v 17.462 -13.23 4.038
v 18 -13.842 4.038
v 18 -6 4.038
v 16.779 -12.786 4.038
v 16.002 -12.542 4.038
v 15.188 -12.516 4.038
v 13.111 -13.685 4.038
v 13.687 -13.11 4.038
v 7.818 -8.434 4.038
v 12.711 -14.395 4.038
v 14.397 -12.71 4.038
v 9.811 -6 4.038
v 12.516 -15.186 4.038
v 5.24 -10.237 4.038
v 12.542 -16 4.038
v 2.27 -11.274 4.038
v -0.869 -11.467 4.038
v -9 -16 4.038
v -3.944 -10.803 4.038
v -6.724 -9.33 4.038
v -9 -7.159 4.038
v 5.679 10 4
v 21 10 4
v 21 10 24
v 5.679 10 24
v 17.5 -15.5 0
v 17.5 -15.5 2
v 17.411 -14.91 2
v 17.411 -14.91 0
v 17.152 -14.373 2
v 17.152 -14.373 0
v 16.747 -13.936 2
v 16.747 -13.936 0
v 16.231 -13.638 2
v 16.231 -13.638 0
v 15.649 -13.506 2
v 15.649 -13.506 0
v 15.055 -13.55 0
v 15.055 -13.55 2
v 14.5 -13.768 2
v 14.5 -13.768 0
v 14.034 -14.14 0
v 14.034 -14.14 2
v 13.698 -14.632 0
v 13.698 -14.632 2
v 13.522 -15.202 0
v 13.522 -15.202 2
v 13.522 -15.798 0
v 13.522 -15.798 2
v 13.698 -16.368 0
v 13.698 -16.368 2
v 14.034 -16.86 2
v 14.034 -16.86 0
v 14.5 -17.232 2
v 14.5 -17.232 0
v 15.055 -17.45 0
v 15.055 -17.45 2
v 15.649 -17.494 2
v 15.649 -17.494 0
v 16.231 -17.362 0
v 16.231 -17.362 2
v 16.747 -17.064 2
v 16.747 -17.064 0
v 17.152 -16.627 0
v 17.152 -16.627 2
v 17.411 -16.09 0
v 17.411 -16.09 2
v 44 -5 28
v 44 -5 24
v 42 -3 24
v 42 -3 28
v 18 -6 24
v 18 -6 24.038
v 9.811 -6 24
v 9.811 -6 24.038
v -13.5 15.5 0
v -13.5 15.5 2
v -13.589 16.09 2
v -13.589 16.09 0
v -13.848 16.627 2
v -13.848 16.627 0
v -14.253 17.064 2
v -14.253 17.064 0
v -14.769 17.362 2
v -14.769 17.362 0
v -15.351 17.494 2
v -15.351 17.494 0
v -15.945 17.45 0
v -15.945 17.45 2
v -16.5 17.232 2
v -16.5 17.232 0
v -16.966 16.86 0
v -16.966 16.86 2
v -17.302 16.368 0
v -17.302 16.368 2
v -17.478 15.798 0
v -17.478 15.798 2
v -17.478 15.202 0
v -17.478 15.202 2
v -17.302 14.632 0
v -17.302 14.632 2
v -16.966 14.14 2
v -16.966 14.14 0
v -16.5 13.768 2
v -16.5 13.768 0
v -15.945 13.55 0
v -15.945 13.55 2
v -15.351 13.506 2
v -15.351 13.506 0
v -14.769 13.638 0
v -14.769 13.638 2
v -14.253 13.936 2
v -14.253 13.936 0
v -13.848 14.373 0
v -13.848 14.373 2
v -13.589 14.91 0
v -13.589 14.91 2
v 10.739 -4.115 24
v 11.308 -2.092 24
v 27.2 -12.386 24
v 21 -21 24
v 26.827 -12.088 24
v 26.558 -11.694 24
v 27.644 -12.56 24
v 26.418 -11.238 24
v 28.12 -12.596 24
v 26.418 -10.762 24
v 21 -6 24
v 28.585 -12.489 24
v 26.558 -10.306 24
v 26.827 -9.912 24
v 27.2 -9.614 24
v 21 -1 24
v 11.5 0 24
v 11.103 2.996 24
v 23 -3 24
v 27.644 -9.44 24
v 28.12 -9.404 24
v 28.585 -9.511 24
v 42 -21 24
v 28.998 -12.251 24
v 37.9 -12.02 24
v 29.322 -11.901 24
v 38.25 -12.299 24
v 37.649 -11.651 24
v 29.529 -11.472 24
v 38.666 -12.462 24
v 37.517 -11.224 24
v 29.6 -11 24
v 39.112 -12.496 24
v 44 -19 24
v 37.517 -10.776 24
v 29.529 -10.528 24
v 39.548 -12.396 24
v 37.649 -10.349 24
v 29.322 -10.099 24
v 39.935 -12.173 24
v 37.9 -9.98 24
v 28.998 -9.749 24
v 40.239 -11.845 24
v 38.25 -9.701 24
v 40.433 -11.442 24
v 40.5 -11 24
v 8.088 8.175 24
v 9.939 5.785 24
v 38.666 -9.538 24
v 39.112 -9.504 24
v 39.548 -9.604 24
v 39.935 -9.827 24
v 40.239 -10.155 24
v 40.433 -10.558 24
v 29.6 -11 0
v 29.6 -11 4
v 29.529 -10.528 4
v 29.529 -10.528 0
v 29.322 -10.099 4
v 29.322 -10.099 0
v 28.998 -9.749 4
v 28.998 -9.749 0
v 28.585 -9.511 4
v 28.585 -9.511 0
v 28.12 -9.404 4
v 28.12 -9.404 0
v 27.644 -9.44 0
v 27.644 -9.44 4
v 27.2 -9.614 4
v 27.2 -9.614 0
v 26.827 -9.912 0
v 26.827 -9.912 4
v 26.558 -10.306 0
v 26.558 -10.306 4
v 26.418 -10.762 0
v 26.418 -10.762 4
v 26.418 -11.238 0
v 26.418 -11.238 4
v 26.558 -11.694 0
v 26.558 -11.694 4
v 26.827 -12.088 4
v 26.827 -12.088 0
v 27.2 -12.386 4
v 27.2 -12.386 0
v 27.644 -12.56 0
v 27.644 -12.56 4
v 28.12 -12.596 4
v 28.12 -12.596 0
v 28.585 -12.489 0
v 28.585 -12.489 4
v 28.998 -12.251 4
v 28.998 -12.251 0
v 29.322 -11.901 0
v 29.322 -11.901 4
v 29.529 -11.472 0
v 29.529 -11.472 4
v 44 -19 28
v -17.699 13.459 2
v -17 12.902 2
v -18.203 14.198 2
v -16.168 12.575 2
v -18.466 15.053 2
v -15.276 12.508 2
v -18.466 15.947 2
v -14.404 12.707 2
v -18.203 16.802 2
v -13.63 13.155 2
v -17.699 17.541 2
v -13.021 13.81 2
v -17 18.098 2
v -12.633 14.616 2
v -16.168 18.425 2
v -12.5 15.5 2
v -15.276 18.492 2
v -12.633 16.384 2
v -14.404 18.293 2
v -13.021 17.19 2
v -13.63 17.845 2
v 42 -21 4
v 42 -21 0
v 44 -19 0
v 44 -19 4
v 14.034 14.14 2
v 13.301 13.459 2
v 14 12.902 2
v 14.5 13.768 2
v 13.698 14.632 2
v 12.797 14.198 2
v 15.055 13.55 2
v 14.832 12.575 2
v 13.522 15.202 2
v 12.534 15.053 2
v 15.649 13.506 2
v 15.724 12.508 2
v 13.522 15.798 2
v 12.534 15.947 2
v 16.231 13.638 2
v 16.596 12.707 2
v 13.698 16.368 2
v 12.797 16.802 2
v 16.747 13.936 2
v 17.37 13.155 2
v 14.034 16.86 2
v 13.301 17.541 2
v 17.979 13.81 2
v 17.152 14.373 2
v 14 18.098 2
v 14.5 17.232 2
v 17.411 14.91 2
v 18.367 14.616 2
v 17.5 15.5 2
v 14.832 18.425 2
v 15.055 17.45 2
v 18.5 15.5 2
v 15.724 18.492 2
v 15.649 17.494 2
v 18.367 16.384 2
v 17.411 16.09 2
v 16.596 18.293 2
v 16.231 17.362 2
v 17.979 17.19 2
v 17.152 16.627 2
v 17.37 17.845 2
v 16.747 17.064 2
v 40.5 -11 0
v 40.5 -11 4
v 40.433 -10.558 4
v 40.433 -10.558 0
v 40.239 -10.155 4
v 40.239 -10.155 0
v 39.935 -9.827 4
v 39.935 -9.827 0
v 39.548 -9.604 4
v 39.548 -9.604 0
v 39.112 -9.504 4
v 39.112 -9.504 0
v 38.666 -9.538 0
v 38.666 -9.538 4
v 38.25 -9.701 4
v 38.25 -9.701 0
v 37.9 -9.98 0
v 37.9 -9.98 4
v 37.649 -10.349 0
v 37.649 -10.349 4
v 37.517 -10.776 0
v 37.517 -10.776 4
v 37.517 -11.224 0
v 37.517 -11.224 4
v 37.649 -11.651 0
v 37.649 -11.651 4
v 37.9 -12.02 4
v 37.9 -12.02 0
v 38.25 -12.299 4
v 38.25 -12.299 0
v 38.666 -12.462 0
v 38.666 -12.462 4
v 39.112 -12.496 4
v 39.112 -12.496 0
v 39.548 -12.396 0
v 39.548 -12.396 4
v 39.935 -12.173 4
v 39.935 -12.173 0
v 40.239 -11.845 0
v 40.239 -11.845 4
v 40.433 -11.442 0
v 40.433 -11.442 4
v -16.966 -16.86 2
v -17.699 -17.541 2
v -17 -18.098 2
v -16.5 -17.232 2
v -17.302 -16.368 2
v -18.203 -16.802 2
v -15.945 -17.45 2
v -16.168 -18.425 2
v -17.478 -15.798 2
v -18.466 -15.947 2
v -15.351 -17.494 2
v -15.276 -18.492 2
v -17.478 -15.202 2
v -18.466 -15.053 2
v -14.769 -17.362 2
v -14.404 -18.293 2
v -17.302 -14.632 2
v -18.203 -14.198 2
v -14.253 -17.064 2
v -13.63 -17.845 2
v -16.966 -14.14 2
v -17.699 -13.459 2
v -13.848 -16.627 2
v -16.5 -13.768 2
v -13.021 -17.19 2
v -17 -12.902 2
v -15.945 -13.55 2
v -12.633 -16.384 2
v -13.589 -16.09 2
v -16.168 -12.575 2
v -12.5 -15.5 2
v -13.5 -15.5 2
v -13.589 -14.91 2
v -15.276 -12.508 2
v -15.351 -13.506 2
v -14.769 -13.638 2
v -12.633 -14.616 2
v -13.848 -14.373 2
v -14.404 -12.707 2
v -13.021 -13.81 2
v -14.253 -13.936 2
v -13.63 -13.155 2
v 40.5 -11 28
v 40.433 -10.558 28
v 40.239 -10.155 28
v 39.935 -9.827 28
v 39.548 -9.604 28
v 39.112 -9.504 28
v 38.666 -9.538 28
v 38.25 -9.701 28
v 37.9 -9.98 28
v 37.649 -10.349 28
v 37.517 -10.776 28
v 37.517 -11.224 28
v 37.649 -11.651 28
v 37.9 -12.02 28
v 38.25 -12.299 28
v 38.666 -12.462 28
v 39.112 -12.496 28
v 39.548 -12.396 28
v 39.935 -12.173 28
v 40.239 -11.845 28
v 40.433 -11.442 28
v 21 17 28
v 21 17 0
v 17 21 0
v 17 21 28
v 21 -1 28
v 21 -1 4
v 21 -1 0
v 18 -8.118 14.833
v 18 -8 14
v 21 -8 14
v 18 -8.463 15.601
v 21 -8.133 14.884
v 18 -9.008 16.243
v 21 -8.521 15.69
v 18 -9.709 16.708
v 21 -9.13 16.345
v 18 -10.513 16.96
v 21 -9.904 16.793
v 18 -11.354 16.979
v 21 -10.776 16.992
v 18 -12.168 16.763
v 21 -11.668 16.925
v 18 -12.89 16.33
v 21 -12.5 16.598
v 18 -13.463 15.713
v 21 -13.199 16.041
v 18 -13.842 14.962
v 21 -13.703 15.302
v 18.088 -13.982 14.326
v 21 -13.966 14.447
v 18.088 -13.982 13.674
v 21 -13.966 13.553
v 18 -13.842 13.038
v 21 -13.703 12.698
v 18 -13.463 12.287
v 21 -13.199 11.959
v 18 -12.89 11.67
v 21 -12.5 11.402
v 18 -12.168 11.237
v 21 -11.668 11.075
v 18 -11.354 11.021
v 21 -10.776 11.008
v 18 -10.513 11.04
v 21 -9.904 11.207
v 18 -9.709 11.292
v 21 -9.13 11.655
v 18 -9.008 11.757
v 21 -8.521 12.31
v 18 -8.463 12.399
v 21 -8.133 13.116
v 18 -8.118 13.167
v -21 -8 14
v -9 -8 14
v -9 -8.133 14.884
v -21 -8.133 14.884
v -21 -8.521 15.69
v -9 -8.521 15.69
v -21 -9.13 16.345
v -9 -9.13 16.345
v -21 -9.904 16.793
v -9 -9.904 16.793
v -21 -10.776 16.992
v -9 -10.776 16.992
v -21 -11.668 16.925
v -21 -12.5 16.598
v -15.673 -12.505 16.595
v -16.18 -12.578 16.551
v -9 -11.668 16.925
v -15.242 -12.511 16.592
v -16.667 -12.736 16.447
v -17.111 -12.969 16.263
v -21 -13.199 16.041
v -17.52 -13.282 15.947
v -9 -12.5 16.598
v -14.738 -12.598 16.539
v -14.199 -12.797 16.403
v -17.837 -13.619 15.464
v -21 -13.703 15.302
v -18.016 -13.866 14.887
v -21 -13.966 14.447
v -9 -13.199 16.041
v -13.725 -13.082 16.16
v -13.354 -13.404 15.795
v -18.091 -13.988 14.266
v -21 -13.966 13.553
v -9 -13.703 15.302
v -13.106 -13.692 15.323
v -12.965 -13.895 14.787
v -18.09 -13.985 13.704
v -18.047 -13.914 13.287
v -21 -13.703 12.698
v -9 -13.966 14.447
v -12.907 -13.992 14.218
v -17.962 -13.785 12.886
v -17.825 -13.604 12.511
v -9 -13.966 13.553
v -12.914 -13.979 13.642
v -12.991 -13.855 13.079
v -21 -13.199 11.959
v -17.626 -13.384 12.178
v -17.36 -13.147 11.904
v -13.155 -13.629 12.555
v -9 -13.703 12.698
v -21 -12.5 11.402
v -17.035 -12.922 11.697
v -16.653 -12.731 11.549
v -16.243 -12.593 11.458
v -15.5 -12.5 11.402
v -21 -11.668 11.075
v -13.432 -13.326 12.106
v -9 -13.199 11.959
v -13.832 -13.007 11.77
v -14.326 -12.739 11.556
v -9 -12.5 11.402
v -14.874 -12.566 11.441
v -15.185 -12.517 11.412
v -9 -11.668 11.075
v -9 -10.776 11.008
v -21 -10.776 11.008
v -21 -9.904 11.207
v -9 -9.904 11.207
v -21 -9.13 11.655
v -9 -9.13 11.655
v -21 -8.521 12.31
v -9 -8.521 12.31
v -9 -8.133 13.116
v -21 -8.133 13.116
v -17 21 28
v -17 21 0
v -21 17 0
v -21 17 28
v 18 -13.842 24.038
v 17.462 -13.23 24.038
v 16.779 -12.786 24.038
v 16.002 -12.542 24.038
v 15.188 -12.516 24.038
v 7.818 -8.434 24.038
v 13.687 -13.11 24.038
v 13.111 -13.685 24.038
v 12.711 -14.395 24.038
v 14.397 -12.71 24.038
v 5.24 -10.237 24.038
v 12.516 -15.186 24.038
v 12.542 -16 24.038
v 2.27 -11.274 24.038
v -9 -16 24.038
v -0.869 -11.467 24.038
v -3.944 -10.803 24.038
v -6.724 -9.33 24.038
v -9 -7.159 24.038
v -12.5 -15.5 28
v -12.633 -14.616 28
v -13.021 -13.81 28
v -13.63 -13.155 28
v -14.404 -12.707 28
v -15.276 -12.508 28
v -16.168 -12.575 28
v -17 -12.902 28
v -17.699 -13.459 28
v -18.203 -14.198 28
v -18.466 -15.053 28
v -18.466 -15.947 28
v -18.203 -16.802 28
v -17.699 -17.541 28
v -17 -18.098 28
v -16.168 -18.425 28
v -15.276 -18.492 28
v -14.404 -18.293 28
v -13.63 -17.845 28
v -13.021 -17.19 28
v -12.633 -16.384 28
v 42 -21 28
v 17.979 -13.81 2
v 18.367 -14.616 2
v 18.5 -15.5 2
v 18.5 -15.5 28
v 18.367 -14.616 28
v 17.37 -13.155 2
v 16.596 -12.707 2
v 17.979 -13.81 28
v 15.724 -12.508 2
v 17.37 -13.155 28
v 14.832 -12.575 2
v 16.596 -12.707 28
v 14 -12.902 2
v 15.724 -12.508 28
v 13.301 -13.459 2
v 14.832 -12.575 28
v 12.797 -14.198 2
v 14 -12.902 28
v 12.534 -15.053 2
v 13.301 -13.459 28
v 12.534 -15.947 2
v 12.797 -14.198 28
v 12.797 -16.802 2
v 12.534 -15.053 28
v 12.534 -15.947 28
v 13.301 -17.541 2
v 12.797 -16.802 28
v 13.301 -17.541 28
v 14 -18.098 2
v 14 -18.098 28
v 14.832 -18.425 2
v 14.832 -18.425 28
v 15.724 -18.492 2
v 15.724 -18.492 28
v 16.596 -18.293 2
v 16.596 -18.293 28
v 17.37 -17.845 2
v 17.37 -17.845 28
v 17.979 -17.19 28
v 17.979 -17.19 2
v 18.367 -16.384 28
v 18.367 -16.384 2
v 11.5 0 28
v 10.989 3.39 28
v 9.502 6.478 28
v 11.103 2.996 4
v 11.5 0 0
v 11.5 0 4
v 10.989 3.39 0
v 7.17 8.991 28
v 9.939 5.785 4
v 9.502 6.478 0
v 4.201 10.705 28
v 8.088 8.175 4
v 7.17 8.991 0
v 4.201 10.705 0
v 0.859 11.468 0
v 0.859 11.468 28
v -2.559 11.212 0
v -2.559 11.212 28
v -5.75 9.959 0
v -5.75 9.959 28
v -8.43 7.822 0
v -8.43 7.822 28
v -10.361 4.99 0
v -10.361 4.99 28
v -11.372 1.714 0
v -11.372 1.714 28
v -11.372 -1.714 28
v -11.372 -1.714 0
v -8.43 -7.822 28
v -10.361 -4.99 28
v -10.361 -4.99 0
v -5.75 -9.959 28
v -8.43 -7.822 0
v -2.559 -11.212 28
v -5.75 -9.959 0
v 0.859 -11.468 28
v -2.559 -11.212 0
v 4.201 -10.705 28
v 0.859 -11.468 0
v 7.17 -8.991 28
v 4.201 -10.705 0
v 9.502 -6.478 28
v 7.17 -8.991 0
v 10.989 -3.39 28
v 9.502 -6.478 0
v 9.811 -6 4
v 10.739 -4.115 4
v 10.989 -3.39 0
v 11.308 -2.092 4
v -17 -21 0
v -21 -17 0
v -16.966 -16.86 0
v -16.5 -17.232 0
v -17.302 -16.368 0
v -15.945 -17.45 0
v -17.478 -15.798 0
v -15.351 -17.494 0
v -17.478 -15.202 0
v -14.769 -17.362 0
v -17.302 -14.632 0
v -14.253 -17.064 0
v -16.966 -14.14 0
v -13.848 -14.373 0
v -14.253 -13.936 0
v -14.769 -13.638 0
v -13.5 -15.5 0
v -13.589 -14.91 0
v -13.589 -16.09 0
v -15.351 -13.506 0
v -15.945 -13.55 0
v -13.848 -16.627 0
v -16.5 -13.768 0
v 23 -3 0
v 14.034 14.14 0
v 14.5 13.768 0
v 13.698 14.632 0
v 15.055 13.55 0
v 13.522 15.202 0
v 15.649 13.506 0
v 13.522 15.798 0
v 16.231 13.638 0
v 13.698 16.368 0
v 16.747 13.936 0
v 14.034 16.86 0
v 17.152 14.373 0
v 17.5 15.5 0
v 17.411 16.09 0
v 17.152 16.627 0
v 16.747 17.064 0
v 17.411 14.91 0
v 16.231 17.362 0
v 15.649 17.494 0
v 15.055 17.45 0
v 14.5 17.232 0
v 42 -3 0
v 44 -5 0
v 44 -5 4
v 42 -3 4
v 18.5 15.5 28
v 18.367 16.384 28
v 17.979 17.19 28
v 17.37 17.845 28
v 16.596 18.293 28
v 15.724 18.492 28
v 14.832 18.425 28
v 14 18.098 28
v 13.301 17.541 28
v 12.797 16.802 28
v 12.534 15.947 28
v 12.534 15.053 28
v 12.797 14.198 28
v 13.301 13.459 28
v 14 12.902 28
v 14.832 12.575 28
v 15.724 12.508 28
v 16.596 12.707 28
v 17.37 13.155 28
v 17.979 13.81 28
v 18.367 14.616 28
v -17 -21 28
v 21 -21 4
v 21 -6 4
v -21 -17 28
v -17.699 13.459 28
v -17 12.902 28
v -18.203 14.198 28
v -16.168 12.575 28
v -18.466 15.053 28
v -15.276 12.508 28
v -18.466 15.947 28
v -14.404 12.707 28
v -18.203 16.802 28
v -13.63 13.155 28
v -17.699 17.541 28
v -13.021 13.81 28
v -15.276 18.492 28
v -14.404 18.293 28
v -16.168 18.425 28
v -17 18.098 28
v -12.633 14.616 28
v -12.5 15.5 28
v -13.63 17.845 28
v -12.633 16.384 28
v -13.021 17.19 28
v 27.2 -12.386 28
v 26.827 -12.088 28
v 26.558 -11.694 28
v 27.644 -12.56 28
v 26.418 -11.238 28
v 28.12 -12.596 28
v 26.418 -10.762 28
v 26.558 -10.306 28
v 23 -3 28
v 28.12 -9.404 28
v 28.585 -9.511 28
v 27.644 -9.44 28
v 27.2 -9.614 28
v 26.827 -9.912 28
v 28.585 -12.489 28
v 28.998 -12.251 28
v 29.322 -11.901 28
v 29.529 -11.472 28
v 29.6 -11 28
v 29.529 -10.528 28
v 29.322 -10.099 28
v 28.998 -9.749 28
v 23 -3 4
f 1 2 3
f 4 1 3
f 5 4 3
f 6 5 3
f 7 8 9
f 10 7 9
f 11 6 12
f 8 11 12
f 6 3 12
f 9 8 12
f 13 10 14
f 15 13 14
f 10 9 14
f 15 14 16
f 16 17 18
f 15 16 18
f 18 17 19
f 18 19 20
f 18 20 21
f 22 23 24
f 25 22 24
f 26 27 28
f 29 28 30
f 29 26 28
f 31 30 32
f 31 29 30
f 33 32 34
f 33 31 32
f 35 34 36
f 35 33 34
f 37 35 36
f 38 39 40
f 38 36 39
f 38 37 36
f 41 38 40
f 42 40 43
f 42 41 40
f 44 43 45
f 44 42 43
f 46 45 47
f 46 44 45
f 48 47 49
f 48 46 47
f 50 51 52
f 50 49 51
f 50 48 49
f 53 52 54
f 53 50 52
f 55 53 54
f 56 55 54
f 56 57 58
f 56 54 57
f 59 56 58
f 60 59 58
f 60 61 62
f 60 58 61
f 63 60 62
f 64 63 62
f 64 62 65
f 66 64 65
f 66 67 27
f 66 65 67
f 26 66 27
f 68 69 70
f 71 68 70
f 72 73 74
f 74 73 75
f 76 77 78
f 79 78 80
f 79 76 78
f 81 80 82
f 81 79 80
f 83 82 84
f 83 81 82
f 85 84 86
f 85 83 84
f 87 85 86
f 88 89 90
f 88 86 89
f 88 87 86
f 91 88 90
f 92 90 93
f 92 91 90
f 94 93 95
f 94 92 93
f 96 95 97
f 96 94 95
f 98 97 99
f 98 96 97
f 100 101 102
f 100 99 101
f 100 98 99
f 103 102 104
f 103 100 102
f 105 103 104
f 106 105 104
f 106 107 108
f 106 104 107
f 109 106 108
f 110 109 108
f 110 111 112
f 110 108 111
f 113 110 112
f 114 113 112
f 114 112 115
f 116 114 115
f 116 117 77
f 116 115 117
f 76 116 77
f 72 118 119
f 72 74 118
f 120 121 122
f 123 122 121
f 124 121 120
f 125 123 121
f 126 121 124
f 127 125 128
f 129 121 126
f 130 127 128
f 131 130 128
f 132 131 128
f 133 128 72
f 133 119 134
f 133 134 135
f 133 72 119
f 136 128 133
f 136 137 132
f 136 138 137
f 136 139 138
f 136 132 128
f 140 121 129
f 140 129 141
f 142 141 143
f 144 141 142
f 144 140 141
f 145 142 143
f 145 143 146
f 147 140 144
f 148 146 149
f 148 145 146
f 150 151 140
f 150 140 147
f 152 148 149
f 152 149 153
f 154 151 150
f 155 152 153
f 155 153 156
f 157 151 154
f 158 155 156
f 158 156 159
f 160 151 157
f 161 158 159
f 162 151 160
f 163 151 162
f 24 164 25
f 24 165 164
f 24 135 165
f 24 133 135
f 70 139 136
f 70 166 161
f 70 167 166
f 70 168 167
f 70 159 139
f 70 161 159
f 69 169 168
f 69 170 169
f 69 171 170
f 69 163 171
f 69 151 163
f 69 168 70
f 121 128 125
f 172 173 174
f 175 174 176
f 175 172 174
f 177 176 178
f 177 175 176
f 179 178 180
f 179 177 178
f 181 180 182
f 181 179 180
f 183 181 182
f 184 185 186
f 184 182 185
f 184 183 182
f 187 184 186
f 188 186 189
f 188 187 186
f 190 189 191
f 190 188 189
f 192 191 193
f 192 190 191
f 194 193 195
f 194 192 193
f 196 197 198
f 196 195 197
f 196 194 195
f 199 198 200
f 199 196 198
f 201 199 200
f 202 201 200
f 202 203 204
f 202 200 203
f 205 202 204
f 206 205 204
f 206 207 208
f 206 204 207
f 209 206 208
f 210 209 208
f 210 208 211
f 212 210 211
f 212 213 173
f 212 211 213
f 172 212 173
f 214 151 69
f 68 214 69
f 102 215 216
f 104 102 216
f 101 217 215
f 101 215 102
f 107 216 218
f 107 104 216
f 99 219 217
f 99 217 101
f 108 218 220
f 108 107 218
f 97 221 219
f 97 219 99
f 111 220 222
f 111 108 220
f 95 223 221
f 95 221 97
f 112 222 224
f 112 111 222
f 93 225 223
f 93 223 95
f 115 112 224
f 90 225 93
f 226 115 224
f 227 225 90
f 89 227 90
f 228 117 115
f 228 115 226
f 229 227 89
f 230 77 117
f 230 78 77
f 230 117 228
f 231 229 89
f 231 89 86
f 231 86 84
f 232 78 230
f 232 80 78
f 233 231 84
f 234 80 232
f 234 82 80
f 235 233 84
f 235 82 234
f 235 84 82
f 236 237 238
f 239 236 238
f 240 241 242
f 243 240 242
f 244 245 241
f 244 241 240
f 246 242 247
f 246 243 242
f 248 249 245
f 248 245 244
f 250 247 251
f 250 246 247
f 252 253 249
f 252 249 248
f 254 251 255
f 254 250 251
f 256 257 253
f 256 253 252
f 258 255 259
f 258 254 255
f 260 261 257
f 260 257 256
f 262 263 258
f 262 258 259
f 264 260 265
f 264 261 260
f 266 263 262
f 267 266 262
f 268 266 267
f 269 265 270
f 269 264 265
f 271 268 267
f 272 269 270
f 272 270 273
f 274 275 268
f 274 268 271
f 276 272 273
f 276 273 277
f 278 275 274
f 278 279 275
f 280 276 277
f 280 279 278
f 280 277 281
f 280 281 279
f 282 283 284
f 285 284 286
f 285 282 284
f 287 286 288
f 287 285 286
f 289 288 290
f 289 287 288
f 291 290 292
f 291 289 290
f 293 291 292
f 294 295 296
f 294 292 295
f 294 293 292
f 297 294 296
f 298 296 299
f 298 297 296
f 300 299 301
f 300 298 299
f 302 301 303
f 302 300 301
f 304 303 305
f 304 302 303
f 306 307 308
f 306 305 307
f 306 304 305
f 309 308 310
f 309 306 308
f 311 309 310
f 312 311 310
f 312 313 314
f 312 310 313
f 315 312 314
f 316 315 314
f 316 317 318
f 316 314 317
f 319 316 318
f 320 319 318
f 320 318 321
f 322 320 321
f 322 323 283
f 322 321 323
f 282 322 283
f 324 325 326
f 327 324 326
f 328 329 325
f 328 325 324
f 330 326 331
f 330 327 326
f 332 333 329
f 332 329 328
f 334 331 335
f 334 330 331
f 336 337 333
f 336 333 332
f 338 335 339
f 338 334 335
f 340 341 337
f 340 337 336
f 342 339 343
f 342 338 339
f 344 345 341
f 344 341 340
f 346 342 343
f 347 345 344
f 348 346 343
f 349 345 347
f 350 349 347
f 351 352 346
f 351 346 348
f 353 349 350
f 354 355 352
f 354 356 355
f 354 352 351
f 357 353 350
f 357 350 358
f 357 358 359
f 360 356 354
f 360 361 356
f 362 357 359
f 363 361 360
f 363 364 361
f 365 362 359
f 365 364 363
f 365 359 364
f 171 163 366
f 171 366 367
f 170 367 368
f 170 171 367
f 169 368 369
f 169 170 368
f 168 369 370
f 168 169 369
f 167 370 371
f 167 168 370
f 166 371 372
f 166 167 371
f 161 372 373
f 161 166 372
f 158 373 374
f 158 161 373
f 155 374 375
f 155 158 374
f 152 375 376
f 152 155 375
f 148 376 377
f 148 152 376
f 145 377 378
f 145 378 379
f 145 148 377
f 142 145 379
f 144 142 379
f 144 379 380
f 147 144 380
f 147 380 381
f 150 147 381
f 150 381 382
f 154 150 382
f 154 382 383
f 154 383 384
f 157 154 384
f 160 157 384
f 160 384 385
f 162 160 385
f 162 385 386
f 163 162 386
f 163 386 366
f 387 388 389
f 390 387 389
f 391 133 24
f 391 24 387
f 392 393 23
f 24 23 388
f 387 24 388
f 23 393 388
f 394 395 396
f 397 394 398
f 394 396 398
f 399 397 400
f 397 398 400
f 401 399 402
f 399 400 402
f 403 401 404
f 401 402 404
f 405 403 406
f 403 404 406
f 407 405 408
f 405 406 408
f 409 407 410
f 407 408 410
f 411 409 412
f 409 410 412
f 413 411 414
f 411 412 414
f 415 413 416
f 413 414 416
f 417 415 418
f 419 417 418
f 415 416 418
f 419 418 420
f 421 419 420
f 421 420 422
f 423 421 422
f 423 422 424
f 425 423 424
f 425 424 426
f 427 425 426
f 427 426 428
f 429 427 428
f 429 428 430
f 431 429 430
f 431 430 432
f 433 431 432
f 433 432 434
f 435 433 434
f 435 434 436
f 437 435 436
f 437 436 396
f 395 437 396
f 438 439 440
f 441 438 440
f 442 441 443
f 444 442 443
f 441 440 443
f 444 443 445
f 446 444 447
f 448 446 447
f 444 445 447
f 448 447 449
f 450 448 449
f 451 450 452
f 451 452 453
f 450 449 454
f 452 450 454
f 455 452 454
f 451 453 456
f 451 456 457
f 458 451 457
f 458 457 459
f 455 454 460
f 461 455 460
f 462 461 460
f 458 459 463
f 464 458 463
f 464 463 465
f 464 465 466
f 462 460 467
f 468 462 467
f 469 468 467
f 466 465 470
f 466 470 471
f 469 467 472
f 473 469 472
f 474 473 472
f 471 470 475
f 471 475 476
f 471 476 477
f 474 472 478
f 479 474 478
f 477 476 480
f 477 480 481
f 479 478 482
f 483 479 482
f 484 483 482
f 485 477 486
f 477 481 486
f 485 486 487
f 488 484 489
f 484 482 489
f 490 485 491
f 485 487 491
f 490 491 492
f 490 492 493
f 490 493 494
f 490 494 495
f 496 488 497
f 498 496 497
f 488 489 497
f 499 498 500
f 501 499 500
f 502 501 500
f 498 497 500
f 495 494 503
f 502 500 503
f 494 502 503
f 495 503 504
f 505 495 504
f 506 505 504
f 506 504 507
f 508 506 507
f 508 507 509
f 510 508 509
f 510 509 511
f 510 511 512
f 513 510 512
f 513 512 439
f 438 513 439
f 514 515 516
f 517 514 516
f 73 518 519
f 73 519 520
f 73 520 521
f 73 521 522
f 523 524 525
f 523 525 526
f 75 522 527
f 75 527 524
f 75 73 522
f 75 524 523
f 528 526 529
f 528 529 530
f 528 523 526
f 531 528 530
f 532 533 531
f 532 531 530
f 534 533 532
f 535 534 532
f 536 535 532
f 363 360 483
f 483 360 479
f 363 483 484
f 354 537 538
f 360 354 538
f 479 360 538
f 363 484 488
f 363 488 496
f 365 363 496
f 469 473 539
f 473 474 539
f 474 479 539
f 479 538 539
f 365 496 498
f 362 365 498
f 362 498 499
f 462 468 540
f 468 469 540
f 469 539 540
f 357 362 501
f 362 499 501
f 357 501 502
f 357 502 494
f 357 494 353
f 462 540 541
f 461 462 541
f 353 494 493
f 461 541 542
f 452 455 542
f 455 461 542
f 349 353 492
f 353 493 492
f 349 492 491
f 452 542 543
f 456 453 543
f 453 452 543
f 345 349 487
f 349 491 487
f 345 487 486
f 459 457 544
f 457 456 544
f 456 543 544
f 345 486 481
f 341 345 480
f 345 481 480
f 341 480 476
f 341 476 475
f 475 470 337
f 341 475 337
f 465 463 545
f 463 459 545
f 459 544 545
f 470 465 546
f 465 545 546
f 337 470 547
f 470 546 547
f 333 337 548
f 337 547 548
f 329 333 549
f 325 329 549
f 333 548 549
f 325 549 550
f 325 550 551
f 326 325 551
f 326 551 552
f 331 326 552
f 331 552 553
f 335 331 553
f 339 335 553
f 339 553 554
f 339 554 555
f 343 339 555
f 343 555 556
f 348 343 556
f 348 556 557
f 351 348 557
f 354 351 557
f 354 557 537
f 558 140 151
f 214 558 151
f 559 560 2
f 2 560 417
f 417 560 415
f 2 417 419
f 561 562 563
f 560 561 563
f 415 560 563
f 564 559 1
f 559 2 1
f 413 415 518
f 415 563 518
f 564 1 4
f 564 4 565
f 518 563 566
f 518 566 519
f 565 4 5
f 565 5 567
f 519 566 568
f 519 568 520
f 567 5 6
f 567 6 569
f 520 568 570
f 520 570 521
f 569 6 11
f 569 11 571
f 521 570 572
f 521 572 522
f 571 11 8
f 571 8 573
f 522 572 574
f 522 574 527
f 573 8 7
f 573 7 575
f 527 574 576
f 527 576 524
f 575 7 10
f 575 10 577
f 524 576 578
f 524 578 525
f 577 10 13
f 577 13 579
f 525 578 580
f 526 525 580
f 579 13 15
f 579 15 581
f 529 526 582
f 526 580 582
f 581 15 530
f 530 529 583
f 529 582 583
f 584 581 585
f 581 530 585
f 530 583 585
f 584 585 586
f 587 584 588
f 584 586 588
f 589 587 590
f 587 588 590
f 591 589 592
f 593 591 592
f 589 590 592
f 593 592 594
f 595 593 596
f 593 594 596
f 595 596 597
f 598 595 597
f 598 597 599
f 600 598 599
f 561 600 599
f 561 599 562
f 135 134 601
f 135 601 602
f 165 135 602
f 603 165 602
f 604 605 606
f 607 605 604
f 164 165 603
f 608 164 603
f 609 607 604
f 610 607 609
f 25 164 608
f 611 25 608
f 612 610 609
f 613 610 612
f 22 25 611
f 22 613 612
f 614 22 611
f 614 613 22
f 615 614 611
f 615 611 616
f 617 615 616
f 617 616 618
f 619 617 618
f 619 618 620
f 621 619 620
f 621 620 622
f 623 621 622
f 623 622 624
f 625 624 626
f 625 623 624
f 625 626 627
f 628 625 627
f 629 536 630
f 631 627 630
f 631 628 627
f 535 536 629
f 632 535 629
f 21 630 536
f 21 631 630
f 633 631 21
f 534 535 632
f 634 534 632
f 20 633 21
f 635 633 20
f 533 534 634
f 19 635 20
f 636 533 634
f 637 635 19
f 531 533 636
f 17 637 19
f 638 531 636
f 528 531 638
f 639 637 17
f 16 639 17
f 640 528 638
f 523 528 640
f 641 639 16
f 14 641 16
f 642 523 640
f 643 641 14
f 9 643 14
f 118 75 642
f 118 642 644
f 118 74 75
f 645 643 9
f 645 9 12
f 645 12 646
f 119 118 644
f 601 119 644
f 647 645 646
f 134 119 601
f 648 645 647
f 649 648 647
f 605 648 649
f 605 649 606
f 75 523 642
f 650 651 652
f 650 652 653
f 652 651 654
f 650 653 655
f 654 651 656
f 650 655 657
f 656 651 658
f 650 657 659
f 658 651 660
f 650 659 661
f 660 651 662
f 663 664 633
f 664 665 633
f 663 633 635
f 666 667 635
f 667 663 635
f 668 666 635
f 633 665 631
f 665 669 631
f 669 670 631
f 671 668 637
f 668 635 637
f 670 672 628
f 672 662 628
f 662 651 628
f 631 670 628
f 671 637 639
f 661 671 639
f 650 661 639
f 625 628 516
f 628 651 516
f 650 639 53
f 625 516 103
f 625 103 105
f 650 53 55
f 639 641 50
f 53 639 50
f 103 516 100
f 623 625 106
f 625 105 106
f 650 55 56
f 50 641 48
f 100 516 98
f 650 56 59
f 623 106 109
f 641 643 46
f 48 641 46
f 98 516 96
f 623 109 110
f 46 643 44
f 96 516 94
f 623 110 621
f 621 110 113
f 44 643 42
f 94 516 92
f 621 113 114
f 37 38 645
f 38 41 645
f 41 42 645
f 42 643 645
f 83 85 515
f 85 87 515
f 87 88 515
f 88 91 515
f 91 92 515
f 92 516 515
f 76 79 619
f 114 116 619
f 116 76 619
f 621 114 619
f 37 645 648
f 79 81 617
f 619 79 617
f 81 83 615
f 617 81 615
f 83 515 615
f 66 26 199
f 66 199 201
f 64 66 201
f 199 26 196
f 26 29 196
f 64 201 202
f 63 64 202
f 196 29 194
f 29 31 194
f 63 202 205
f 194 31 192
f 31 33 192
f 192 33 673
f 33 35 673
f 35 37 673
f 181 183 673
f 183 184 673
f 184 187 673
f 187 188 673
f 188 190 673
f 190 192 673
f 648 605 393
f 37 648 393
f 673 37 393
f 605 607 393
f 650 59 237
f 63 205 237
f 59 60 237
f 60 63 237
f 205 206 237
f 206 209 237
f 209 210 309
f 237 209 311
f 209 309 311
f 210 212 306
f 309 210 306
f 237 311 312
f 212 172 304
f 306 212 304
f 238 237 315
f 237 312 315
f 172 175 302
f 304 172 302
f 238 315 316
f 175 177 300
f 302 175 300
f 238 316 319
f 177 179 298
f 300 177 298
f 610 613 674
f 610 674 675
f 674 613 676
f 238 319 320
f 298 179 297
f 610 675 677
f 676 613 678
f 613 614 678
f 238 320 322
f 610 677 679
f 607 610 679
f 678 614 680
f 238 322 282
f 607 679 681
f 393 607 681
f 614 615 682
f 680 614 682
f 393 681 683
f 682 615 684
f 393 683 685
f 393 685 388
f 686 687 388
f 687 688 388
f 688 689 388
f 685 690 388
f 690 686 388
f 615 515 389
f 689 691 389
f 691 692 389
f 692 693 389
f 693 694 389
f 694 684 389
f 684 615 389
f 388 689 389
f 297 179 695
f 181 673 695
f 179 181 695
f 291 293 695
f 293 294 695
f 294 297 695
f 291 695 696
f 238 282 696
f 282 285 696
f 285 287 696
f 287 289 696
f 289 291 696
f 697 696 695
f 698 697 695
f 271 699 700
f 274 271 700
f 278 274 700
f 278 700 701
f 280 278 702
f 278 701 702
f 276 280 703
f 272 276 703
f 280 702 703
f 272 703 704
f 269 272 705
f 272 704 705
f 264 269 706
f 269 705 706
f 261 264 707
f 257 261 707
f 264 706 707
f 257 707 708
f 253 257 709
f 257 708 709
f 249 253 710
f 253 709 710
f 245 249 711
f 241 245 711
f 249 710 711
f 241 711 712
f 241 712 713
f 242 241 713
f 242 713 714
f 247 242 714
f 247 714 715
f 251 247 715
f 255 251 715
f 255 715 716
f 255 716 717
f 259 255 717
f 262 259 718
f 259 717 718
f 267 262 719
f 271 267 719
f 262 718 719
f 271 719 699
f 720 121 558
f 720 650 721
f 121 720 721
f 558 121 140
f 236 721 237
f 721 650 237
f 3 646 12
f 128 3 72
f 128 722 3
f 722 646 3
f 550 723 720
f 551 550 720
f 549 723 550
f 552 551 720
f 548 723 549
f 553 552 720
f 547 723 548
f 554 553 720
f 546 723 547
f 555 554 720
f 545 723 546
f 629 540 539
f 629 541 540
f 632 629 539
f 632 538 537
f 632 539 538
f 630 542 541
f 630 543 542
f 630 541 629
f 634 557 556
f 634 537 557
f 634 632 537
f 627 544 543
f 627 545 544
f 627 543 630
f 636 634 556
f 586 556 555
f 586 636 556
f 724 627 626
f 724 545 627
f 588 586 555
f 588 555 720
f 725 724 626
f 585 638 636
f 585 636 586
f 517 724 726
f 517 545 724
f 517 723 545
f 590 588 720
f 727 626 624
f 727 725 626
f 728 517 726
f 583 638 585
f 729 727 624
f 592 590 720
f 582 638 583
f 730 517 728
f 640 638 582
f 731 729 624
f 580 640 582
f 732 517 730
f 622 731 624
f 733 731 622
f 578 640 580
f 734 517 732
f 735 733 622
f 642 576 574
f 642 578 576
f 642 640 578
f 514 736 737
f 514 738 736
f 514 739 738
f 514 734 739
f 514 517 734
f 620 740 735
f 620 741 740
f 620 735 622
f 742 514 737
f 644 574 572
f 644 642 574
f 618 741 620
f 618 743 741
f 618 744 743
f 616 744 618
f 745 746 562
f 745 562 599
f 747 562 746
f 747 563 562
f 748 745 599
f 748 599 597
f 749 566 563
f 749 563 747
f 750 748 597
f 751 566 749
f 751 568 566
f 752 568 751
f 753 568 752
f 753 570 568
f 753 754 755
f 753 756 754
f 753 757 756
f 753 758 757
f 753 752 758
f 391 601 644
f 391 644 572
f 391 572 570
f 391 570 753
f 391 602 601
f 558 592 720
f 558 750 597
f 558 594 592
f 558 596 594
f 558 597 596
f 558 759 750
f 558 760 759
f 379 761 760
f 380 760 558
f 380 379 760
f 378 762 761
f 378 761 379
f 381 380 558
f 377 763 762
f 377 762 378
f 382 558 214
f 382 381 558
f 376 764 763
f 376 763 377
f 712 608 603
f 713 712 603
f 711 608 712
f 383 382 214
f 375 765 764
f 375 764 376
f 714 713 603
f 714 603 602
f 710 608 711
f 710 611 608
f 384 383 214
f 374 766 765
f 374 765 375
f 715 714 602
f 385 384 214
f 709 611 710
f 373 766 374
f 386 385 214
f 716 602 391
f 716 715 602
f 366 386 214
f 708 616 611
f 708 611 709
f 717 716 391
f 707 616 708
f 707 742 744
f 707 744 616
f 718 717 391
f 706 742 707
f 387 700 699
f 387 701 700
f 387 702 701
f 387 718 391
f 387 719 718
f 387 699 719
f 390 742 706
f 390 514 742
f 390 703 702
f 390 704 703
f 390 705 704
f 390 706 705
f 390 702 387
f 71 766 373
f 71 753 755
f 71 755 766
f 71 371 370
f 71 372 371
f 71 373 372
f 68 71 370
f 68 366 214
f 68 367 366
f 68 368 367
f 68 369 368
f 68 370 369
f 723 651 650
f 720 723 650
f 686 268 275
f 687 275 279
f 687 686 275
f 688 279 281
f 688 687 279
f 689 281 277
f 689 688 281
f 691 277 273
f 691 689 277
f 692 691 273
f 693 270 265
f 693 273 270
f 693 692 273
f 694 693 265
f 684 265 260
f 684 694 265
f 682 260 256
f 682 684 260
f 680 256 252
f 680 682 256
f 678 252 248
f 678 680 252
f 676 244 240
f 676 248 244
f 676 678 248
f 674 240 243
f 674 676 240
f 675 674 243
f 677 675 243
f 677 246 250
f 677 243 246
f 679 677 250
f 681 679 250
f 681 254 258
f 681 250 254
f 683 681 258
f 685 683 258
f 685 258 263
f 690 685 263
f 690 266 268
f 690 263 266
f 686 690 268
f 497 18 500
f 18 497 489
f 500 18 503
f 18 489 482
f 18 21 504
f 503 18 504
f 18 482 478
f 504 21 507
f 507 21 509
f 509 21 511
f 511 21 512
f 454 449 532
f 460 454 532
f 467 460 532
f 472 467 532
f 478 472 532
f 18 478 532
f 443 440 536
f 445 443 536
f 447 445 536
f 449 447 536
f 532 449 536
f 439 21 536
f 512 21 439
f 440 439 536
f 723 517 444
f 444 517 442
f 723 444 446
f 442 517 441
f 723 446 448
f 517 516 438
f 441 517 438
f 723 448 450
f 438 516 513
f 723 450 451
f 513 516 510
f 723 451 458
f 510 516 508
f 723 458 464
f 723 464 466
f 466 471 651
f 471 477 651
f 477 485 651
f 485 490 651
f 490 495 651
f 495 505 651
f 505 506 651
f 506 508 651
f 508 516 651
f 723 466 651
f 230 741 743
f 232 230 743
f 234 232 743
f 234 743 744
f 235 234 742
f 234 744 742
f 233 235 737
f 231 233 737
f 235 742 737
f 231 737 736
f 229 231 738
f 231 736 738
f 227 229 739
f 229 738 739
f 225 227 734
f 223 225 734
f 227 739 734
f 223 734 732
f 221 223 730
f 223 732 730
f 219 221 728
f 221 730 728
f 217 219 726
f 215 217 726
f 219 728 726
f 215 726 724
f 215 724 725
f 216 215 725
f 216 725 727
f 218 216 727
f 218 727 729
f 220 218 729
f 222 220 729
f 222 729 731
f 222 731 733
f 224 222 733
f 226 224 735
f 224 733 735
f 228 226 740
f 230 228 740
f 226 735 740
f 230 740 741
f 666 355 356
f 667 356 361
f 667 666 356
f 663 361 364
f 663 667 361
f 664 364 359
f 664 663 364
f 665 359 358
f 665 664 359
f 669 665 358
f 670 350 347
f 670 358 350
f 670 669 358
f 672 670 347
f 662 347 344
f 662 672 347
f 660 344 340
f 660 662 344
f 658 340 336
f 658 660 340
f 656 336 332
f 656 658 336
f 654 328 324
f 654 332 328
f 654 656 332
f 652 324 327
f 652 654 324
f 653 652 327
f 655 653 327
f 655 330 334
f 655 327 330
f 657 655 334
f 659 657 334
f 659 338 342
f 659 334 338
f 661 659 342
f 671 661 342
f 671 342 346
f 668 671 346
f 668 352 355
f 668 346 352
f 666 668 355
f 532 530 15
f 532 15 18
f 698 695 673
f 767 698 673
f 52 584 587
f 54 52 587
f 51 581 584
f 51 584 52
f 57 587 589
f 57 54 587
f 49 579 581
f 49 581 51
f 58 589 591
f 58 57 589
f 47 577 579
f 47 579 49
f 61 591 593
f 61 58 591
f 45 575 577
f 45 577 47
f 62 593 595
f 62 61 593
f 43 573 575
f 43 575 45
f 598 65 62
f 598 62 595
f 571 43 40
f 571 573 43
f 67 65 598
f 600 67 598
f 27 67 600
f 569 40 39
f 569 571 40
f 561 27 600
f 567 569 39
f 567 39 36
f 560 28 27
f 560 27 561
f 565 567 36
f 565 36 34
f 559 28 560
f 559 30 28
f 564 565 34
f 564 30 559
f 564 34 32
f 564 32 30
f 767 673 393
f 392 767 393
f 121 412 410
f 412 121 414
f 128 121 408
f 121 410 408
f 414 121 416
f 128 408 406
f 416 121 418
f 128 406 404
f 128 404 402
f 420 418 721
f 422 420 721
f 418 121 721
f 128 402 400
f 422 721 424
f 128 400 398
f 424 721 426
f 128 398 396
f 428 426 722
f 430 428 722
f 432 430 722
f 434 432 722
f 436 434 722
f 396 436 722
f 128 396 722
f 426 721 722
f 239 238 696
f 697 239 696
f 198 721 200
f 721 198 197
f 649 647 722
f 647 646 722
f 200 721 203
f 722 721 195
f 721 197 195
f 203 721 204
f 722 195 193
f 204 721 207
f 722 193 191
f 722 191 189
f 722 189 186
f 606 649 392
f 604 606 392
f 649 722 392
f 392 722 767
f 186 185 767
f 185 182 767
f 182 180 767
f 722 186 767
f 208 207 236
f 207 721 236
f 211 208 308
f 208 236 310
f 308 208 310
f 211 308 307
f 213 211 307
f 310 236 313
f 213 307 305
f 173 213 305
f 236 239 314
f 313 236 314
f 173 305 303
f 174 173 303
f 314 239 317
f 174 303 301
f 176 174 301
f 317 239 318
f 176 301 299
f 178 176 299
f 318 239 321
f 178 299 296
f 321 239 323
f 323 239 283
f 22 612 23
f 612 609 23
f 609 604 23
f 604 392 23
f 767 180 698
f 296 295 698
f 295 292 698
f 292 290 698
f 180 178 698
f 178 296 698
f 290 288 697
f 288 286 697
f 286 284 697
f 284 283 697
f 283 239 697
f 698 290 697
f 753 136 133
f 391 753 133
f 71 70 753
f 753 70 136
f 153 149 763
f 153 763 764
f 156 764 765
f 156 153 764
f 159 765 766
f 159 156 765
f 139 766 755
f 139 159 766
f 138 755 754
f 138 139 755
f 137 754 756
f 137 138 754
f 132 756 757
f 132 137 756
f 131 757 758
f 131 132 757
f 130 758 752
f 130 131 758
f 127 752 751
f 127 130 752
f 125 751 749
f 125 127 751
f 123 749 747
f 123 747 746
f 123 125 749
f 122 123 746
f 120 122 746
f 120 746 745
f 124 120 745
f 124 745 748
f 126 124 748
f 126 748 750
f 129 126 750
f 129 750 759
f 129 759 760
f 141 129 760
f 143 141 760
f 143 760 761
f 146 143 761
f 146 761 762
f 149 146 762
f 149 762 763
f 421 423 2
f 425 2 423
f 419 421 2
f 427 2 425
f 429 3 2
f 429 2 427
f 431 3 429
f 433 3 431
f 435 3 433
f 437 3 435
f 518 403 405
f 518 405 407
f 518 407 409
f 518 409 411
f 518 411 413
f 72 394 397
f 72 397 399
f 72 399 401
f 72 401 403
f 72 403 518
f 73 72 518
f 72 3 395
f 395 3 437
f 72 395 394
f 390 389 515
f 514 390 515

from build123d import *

# Parameters (mm, degrees)
SKETCH_R        = 2
SKETCH_R_2      = 11.5
SKETCH_R_3      = 1.6
SKETCH_R_4      = 1.5
PAD_DEPTH       = 28
SKETCH003_W     = 29
SKETCH003_H     = 20
POCKET_DEPTH    = 42
SKETCH004_R     = 3
POCKET001_DEPTH = 26
SKETCH005_R     = 3
POCKET002_DEPTH = 42
SKETCH006_W     = 16
SKETCH006_H     = 20
POCKET003_DEPTH = 16
SKETCH007_W     = 27
SKETCH007_H     = 20
POCKET004_DEPTH = 10


with BuildPart() as part:
    # Sketch → Pad (new body)
    with BuildSketch(Plane.XY):
        Polygon((-17, 21), (-21, 17), (-21, -17), (-17, -21), (42, -21), (44, -19), (44, -5), (42, -3), (23, -3), (21, -1), (21, 17), (17, 21), align=None)
        with Locations((-15.5, -15.5)):
            Circle(SKETCH_R, mode=Mode.SUBTRACT)
        with Locations((15.5, -15.5)):
            Circle(SKETCH_R, mode=Mode.SUBTRACT)
        with Locations((15.5, 15.5)):
            Circle(SKETCH_R, mode=Mode.SUBTRACT)
        with Locations((-15.5, 15.5)):
            Circle(SKETCH_R, mode=Mode.SUBTRACT)
        Circle(SKETCH_R_2, mode=Mode.SUBTRACT)
        with Locations((28, -11)):
            Circle(SKETCH_R_3, mode=Mode.SUBTRACT)
        with Locations((39, -11)):
            Circle(SKETCH_R_4, mode=Mode.SUBTRACT)
    extrude(amount=PAD_DEPTH)

    # Sketch003 (on Face4 of Pad) → Pocket (cut)
    with BuildSketch(Plane.XZ.offset(21)):
        with Locations((35.5, 14)):
            Rectangle(SKETCH003_W, SKETCH003_H)
    extrude(amount=-POCKET_DEPTH, mode=Mode.SUBTRACT)

    # Sketch004 (on Face5 of Pocket) → Pocket001 (cut)
    with BuildSketch(Plane.XY.offset(28)):
        with Locations((-15.5, -15.5)):
            Circle(SKETCH004_R)
        with Locations((-15.5, 15.5)):
            Circle(SKETCH004_R)
        with Locations((15.5, 15.5)):
            Circle(SKETCH004_R)
        with Locations((15.5, -15.5)):
            Circle(SKETCH004_R)
    extrude(amount=-POCKET001_DEPTH, mode=Mode.SUBTRACT)

    # Sketch005 (on Face14 of Pocket001) → Pocket002 (cut)
    with BuildSketch(Plane.YZ.offset(21)):
        with Locations((-11, 14)):
            Circle(SKETCH005_R)
    extrude(amount=-POCKET002_DEPTH, mode=Mode.SUBTRACT)

    # Sketch006 (on Face15 of Pocket002) → Pocket003 (cut)
    with BuildSketch(Plane.YZ.offset(21)):
        with Locations((2, 14)):
            Rectangle(SKETCH006_W, SKETCH006_H)
    extrude(amount=-POCKET003_DEPTH, mode=Mode.SUBTRACT)

    # Sketch007 (on Face36 of Pocket003) → Pocket004 (cut)
    with BuildSketch(Plane(origin=(0, -6, 0), x_dir=(-1, 0, 0), z_dir=(0, 1, 0))):
        with Locations((-4.5, 14.038037)):
            Rectangle(SKETCH007_W, SKETCH007_H)
    extrude(amount=-POCKET004_DEPTH, mode=Mode.SUBTRACT)


solid = part.part
